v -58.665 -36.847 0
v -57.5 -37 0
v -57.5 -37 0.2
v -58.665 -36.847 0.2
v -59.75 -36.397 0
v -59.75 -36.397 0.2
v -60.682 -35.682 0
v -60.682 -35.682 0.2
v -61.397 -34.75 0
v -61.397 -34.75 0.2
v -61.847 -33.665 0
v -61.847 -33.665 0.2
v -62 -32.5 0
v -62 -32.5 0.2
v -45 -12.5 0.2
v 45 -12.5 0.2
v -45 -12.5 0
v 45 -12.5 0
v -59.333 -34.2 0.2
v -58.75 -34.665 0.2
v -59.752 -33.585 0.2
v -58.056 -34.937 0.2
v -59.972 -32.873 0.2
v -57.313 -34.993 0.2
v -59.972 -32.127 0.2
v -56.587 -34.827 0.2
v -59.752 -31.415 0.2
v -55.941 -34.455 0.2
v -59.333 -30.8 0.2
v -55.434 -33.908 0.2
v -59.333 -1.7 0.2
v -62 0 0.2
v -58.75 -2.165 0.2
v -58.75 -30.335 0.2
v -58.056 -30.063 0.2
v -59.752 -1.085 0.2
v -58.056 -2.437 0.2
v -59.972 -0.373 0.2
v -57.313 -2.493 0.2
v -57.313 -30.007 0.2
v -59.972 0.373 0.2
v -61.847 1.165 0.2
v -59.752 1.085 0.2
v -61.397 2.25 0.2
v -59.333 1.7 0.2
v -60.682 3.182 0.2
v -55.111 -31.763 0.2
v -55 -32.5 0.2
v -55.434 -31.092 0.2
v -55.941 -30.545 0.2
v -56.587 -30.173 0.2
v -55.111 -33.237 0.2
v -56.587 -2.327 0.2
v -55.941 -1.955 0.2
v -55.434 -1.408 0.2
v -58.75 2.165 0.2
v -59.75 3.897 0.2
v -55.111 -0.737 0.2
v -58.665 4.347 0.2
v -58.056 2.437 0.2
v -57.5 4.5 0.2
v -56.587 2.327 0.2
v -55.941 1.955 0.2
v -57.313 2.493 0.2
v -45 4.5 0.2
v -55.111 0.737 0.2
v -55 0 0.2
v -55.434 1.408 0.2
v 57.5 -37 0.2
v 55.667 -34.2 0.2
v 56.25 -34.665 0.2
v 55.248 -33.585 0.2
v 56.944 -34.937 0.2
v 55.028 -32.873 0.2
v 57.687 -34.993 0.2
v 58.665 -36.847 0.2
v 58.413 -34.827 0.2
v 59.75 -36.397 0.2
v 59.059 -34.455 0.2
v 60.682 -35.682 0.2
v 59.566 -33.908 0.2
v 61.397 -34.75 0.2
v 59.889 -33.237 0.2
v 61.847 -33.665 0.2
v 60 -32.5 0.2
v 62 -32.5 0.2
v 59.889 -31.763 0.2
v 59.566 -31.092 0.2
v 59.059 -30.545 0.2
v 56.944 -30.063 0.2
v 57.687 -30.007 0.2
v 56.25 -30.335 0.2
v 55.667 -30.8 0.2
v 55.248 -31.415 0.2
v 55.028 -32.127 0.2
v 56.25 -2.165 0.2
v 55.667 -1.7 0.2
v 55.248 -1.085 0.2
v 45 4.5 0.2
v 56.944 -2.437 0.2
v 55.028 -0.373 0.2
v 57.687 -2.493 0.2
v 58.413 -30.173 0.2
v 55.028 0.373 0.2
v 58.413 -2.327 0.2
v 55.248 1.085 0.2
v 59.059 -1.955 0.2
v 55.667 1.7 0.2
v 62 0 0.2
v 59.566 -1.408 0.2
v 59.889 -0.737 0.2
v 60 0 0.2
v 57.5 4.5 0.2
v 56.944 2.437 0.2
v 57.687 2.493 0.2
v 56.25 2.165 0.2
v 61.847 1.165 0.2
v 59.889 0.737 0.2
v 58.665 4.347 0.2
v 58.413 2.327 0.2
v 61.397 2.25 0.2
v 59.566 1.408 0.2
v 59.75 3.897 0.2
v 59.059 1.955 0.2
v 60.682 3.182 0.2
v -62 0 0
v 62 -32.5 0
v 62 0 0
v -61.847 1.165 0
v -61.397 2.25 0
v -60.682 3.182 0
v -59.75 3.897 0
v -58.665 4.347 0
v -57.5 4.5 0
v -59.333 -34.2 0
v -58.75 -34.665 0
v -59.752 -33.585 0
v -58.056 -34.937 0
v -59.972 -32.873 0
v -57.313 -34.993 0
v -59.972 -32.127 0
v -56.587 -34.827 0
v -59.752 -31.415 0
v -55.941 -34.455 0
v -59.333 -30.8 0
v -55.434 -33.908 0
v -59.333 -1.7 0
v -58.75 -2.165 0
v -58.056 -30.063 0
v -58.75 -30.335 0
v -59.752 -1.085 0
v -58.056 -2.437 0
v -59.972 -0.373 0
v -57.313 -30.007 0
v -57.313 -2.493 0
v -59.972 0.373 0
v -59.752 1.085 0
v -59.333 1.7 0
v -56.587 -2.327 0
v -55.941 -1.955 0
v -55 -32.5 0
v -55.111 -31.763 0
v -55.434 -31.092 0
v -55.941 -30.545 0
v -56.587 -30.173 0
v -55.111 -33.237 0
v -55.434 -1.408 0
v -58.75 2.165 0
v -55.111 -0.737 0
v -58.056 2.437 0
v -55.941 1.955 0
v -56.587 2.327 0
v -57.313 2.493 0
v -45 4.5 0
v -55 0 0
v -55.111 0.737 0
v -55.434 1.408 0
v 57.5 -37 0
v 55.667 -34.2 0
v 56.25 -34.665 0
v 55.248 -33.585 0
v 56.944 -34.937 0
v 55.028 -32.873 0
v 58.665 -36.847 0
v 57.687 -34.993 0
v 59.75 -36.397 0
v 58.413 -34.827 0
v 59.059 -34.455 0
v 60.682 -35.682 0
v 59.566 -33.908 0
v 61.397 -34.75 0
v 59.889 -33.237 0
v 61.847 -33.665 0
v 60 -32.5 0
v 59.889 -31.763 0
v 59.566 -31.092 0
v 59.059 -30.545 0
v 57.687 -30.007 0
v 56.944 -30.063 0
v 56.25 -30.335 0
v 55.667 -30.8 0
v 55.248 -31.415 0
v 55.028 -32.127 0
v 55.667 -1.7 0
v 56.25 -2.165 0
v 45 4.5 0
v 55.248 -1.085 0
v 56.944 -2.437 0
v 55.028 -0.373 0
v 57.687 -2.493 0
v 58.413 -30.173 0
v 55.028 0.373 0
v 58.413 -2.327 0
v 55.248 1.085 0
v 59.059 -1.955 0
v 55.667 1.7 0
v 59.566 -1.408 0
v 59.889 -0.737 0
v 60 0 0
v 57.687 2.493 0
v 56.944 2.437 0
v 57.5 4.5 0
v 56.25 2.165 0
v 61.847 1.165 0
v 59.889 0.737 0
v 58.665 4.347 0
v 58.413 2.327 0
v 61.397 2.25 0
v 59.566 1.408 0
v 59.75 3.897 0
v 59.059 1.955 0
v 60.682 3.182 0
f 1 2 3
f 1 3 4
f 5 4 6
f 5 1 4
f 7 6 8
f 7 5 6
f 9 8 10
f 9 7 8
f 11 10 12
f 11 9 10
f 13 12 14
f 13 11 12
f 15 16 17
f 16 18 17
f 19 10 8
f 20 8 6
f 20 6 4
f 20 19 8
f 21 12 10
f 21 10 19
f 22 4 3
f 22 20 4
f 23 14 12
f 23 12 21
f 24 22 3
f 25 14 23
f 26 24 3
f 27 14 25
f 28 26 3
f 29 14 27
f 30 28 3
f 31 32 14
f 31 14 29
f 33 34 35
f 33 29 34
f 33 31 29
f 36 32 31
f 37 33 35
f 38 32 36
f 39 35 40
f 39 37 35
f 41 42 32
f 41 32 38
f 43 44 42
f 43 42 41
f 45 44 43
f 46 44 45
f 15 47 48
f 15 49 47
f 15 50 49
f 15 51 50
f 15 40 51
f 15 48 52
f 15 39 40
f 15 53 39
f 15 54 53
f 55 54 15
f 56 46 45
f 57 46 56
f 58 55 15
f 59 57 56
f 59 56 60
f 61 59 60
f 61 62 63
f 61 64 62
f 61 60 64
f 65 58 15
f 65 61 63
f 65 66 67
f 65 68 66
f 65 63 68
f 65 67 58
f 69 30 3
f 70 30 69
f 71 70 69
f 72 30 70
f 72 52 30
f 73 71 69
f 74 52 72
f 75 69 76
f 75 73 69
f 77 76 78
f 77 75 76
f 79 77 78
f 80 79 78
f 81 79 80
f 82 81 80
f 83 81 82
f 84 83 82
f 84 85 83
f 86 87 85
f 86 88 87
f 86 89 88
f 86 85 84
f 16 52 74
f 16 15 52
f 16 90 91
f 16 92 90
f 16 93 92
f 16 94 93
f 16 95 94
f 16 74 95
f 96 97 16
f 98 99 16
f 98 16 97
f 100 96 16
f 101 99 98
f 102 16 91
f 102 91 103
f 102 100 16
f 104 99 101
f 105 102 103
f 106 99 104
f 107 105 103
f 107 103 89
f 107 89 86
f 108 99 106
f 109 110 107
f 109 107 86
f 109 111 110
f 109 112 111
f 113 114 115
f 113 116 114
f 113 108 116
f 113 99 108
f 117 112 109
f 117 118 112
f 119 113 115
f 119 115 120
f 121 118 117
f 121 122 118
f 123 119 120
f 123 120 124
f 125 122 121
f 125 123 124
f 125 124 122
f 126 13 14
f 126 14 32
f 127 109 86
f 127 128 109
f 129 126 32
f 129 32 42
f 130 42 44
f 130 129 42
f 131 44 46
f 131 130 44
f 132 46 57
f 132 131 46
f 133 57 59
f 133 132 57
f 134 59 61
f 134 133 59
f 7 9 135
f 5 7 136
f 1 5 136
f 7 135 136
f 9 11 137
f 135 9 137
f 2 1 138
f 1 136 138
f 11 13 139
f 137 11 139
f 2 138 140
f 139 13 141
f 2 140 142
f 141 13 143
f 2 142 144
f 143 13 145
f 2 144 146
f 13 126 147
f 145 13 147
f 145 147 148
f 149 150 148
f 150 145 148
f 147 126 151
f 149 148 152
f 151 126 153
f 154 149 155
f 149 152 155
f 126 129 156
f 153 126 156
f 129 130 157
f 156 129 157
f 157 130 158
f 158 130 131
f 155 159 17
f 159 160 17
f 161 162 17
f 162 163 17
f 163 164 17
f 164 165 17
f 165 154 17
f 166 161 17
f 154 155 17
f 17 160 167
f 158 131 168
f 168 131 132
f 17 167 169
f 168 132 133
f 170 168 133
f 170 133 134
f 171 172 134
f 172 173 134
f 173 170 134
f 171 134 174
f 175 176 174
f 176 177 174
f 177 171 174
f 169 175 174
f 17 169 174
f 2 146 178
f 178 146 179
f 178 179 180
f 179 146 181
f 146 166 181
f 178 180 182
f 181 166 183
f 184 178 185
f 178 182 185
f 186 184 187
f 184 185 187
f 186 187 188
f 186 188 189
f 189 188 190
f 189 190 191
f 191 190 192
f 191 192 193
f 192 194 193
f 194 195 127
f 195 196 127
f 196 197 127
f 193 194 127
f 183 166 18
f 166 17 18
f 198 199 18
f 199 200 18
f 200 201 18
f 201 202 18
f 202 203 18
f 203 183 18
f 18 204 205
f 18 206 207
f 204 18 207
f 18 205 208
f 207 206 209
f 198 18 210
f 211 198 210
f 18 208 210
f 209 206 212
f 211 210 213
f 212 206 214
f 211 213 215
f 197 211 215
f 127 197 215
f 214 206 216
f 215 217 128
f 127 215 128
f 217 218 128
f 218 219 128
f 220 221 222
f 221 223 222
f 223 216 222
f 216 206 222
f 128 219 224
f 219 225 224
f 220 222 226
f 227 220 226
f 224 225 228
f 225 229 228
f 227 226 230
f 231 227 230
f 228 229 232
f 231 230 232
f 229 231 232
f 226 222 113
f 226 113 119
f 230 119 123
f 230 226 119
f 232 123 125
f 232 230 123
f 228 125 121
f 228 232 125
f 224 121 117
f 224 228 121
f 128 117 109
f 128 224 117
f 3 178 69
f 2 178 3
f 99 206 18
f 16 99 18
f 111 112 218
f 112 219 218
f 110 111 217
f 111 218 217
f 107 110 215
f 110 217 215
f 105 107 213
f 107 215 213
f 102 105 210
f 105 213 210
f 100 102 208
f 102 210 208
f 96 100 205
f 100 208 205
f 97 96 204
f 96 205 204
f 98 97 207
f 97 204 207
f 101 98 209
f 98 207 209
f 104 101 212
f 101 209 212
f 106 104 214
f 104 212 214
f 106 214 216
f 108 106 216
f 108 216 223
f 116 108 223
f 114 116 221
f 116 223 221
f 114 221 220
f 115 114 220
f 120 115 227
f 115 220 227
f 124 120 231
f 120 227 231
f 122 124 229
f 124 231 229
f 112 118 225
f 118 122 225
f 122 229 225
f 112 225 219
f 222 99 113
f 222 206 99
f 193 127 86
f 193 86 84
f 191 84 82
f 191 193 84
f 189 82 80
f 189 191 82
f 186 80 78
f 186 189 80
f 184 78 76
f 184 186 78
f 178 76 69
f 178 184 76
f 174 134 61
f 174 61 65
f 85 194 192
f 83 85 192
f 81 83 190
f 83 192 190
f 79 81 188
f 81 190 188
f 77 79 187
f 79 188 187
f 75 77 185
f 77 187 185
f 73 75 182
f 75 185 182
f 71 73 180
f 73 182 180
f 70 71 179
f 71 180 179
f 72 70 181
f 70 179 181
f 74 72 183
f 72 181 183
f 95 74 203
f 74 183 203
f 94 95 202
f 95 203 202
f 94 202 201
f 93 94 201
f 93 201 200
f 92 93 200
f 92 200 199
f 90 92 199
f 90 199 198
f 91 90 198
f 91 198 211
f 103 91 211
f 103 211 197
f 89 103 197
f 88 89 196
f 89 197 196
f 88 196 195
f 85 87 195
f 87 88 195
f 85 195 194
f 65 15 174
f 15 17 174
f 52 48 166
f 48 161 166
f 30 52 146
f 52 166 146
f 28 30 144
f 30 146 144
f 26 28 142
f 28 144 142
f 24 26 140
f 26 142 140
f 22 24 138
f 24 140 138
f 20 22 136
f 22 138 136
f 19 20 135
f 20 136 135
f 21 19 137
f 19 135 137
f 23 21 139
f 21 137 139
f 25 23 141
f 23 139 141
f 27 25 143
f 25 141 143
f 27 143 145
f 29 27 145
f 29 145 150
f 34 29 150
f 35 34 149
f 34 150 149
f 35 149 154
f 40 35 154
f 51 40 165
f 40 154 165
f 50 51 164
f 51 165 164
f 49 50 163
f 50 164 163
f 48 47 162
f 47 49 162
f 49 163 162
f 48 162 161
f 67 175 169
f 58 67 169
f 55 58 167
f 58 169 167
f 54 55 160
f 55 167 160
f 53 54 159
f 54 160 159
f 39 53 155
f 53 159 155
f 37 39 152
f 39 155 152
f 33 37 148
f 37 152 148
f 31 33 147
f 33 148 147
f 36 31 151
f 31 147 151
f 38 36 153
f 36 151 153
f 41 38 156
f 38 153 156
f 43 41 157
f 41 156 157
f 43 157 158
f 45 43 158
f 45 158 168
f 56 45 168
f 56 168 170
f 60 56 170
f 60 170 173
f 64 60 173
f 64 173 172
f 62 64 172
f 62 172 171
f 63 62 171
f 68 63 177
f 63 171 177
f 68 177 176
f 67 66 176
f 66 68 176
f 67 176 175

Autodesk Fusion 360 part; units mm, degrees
sketch "Sketch1" plane through (0, 0, 0) normal (0, 0, 1) x (1, 0, 0)
  line L0 (0, 0) -> (55, 0) construction
  line L1 (0, 0) -> (-55, 0) construction
  circle A0 centre (-57.5, 0) radius 2.5
  circle A1 centre (57.5, 0) radius 2.5
  line L2 (-57.5, -2.5) -> (-57.5, -30) construction
  line L3 (57.5, -2.5) -> (57.5, -30) construction
  circle A2 centre (57.5, -32.5) radius 2.5
  circle A3 centre (-57.5, -32.5) radius 2.5
  circle A4 centre (57.5, 0) radius 4.5
  circle A5 centre (57.5, -32.5) radius 4.5
  circle A6 centre (-57.5, -32.5) radius 4.5
  circle A7 centre (-57.5, 0) radius 4.5
  line L4 (-57.5, 4.5) -> (57.5, 4.5)
  line L5 (62, 0) -> (62, -32.5)
  line L6 (57.5, -37) -> (-57.5, -37)
  line L7 (-62, -32.5) -> (-62, 0)
  line L8 (45, -12.5) -> (-45, -12.5)
  line L9 (-45, -12.5) -> (-45, 12.5)
  line L10 (-45, 12.5) -> (45, 12.5)
  line L11 (45, 12.5) -> (45, -12.5)
  line L12 (45, -12.5) -> (-45, 12.5) construction
  line L13 (-45, -12.5) -> (45, 12.5) construction
  dimension "d1" = 55
  dimension "d2" = 55
  dimension "d4" = 27.5
  dimension "d5" = 27.5
  dimension "d6" = 5
  dimension "d7" = 5
  dimension "d8" = 9
  dimension "d9" = 9
  dimension "d10" = 9
  dimension "d11" = 9
  dimension "d12" = 90
  dimension "d13" = 25
extrude "Extrude1" add sketch "Sketch1" along normal blind 0.2 contours A4 | A4 A5 A6 A7 L4 L5 L6 L7 L8 L9 L11 | A5 | A6 | A7
equation "d1 = ( 110 / 2 ) * 1 mm"
equation "d2 = ( 110 / 2 ) * 1 mm"
